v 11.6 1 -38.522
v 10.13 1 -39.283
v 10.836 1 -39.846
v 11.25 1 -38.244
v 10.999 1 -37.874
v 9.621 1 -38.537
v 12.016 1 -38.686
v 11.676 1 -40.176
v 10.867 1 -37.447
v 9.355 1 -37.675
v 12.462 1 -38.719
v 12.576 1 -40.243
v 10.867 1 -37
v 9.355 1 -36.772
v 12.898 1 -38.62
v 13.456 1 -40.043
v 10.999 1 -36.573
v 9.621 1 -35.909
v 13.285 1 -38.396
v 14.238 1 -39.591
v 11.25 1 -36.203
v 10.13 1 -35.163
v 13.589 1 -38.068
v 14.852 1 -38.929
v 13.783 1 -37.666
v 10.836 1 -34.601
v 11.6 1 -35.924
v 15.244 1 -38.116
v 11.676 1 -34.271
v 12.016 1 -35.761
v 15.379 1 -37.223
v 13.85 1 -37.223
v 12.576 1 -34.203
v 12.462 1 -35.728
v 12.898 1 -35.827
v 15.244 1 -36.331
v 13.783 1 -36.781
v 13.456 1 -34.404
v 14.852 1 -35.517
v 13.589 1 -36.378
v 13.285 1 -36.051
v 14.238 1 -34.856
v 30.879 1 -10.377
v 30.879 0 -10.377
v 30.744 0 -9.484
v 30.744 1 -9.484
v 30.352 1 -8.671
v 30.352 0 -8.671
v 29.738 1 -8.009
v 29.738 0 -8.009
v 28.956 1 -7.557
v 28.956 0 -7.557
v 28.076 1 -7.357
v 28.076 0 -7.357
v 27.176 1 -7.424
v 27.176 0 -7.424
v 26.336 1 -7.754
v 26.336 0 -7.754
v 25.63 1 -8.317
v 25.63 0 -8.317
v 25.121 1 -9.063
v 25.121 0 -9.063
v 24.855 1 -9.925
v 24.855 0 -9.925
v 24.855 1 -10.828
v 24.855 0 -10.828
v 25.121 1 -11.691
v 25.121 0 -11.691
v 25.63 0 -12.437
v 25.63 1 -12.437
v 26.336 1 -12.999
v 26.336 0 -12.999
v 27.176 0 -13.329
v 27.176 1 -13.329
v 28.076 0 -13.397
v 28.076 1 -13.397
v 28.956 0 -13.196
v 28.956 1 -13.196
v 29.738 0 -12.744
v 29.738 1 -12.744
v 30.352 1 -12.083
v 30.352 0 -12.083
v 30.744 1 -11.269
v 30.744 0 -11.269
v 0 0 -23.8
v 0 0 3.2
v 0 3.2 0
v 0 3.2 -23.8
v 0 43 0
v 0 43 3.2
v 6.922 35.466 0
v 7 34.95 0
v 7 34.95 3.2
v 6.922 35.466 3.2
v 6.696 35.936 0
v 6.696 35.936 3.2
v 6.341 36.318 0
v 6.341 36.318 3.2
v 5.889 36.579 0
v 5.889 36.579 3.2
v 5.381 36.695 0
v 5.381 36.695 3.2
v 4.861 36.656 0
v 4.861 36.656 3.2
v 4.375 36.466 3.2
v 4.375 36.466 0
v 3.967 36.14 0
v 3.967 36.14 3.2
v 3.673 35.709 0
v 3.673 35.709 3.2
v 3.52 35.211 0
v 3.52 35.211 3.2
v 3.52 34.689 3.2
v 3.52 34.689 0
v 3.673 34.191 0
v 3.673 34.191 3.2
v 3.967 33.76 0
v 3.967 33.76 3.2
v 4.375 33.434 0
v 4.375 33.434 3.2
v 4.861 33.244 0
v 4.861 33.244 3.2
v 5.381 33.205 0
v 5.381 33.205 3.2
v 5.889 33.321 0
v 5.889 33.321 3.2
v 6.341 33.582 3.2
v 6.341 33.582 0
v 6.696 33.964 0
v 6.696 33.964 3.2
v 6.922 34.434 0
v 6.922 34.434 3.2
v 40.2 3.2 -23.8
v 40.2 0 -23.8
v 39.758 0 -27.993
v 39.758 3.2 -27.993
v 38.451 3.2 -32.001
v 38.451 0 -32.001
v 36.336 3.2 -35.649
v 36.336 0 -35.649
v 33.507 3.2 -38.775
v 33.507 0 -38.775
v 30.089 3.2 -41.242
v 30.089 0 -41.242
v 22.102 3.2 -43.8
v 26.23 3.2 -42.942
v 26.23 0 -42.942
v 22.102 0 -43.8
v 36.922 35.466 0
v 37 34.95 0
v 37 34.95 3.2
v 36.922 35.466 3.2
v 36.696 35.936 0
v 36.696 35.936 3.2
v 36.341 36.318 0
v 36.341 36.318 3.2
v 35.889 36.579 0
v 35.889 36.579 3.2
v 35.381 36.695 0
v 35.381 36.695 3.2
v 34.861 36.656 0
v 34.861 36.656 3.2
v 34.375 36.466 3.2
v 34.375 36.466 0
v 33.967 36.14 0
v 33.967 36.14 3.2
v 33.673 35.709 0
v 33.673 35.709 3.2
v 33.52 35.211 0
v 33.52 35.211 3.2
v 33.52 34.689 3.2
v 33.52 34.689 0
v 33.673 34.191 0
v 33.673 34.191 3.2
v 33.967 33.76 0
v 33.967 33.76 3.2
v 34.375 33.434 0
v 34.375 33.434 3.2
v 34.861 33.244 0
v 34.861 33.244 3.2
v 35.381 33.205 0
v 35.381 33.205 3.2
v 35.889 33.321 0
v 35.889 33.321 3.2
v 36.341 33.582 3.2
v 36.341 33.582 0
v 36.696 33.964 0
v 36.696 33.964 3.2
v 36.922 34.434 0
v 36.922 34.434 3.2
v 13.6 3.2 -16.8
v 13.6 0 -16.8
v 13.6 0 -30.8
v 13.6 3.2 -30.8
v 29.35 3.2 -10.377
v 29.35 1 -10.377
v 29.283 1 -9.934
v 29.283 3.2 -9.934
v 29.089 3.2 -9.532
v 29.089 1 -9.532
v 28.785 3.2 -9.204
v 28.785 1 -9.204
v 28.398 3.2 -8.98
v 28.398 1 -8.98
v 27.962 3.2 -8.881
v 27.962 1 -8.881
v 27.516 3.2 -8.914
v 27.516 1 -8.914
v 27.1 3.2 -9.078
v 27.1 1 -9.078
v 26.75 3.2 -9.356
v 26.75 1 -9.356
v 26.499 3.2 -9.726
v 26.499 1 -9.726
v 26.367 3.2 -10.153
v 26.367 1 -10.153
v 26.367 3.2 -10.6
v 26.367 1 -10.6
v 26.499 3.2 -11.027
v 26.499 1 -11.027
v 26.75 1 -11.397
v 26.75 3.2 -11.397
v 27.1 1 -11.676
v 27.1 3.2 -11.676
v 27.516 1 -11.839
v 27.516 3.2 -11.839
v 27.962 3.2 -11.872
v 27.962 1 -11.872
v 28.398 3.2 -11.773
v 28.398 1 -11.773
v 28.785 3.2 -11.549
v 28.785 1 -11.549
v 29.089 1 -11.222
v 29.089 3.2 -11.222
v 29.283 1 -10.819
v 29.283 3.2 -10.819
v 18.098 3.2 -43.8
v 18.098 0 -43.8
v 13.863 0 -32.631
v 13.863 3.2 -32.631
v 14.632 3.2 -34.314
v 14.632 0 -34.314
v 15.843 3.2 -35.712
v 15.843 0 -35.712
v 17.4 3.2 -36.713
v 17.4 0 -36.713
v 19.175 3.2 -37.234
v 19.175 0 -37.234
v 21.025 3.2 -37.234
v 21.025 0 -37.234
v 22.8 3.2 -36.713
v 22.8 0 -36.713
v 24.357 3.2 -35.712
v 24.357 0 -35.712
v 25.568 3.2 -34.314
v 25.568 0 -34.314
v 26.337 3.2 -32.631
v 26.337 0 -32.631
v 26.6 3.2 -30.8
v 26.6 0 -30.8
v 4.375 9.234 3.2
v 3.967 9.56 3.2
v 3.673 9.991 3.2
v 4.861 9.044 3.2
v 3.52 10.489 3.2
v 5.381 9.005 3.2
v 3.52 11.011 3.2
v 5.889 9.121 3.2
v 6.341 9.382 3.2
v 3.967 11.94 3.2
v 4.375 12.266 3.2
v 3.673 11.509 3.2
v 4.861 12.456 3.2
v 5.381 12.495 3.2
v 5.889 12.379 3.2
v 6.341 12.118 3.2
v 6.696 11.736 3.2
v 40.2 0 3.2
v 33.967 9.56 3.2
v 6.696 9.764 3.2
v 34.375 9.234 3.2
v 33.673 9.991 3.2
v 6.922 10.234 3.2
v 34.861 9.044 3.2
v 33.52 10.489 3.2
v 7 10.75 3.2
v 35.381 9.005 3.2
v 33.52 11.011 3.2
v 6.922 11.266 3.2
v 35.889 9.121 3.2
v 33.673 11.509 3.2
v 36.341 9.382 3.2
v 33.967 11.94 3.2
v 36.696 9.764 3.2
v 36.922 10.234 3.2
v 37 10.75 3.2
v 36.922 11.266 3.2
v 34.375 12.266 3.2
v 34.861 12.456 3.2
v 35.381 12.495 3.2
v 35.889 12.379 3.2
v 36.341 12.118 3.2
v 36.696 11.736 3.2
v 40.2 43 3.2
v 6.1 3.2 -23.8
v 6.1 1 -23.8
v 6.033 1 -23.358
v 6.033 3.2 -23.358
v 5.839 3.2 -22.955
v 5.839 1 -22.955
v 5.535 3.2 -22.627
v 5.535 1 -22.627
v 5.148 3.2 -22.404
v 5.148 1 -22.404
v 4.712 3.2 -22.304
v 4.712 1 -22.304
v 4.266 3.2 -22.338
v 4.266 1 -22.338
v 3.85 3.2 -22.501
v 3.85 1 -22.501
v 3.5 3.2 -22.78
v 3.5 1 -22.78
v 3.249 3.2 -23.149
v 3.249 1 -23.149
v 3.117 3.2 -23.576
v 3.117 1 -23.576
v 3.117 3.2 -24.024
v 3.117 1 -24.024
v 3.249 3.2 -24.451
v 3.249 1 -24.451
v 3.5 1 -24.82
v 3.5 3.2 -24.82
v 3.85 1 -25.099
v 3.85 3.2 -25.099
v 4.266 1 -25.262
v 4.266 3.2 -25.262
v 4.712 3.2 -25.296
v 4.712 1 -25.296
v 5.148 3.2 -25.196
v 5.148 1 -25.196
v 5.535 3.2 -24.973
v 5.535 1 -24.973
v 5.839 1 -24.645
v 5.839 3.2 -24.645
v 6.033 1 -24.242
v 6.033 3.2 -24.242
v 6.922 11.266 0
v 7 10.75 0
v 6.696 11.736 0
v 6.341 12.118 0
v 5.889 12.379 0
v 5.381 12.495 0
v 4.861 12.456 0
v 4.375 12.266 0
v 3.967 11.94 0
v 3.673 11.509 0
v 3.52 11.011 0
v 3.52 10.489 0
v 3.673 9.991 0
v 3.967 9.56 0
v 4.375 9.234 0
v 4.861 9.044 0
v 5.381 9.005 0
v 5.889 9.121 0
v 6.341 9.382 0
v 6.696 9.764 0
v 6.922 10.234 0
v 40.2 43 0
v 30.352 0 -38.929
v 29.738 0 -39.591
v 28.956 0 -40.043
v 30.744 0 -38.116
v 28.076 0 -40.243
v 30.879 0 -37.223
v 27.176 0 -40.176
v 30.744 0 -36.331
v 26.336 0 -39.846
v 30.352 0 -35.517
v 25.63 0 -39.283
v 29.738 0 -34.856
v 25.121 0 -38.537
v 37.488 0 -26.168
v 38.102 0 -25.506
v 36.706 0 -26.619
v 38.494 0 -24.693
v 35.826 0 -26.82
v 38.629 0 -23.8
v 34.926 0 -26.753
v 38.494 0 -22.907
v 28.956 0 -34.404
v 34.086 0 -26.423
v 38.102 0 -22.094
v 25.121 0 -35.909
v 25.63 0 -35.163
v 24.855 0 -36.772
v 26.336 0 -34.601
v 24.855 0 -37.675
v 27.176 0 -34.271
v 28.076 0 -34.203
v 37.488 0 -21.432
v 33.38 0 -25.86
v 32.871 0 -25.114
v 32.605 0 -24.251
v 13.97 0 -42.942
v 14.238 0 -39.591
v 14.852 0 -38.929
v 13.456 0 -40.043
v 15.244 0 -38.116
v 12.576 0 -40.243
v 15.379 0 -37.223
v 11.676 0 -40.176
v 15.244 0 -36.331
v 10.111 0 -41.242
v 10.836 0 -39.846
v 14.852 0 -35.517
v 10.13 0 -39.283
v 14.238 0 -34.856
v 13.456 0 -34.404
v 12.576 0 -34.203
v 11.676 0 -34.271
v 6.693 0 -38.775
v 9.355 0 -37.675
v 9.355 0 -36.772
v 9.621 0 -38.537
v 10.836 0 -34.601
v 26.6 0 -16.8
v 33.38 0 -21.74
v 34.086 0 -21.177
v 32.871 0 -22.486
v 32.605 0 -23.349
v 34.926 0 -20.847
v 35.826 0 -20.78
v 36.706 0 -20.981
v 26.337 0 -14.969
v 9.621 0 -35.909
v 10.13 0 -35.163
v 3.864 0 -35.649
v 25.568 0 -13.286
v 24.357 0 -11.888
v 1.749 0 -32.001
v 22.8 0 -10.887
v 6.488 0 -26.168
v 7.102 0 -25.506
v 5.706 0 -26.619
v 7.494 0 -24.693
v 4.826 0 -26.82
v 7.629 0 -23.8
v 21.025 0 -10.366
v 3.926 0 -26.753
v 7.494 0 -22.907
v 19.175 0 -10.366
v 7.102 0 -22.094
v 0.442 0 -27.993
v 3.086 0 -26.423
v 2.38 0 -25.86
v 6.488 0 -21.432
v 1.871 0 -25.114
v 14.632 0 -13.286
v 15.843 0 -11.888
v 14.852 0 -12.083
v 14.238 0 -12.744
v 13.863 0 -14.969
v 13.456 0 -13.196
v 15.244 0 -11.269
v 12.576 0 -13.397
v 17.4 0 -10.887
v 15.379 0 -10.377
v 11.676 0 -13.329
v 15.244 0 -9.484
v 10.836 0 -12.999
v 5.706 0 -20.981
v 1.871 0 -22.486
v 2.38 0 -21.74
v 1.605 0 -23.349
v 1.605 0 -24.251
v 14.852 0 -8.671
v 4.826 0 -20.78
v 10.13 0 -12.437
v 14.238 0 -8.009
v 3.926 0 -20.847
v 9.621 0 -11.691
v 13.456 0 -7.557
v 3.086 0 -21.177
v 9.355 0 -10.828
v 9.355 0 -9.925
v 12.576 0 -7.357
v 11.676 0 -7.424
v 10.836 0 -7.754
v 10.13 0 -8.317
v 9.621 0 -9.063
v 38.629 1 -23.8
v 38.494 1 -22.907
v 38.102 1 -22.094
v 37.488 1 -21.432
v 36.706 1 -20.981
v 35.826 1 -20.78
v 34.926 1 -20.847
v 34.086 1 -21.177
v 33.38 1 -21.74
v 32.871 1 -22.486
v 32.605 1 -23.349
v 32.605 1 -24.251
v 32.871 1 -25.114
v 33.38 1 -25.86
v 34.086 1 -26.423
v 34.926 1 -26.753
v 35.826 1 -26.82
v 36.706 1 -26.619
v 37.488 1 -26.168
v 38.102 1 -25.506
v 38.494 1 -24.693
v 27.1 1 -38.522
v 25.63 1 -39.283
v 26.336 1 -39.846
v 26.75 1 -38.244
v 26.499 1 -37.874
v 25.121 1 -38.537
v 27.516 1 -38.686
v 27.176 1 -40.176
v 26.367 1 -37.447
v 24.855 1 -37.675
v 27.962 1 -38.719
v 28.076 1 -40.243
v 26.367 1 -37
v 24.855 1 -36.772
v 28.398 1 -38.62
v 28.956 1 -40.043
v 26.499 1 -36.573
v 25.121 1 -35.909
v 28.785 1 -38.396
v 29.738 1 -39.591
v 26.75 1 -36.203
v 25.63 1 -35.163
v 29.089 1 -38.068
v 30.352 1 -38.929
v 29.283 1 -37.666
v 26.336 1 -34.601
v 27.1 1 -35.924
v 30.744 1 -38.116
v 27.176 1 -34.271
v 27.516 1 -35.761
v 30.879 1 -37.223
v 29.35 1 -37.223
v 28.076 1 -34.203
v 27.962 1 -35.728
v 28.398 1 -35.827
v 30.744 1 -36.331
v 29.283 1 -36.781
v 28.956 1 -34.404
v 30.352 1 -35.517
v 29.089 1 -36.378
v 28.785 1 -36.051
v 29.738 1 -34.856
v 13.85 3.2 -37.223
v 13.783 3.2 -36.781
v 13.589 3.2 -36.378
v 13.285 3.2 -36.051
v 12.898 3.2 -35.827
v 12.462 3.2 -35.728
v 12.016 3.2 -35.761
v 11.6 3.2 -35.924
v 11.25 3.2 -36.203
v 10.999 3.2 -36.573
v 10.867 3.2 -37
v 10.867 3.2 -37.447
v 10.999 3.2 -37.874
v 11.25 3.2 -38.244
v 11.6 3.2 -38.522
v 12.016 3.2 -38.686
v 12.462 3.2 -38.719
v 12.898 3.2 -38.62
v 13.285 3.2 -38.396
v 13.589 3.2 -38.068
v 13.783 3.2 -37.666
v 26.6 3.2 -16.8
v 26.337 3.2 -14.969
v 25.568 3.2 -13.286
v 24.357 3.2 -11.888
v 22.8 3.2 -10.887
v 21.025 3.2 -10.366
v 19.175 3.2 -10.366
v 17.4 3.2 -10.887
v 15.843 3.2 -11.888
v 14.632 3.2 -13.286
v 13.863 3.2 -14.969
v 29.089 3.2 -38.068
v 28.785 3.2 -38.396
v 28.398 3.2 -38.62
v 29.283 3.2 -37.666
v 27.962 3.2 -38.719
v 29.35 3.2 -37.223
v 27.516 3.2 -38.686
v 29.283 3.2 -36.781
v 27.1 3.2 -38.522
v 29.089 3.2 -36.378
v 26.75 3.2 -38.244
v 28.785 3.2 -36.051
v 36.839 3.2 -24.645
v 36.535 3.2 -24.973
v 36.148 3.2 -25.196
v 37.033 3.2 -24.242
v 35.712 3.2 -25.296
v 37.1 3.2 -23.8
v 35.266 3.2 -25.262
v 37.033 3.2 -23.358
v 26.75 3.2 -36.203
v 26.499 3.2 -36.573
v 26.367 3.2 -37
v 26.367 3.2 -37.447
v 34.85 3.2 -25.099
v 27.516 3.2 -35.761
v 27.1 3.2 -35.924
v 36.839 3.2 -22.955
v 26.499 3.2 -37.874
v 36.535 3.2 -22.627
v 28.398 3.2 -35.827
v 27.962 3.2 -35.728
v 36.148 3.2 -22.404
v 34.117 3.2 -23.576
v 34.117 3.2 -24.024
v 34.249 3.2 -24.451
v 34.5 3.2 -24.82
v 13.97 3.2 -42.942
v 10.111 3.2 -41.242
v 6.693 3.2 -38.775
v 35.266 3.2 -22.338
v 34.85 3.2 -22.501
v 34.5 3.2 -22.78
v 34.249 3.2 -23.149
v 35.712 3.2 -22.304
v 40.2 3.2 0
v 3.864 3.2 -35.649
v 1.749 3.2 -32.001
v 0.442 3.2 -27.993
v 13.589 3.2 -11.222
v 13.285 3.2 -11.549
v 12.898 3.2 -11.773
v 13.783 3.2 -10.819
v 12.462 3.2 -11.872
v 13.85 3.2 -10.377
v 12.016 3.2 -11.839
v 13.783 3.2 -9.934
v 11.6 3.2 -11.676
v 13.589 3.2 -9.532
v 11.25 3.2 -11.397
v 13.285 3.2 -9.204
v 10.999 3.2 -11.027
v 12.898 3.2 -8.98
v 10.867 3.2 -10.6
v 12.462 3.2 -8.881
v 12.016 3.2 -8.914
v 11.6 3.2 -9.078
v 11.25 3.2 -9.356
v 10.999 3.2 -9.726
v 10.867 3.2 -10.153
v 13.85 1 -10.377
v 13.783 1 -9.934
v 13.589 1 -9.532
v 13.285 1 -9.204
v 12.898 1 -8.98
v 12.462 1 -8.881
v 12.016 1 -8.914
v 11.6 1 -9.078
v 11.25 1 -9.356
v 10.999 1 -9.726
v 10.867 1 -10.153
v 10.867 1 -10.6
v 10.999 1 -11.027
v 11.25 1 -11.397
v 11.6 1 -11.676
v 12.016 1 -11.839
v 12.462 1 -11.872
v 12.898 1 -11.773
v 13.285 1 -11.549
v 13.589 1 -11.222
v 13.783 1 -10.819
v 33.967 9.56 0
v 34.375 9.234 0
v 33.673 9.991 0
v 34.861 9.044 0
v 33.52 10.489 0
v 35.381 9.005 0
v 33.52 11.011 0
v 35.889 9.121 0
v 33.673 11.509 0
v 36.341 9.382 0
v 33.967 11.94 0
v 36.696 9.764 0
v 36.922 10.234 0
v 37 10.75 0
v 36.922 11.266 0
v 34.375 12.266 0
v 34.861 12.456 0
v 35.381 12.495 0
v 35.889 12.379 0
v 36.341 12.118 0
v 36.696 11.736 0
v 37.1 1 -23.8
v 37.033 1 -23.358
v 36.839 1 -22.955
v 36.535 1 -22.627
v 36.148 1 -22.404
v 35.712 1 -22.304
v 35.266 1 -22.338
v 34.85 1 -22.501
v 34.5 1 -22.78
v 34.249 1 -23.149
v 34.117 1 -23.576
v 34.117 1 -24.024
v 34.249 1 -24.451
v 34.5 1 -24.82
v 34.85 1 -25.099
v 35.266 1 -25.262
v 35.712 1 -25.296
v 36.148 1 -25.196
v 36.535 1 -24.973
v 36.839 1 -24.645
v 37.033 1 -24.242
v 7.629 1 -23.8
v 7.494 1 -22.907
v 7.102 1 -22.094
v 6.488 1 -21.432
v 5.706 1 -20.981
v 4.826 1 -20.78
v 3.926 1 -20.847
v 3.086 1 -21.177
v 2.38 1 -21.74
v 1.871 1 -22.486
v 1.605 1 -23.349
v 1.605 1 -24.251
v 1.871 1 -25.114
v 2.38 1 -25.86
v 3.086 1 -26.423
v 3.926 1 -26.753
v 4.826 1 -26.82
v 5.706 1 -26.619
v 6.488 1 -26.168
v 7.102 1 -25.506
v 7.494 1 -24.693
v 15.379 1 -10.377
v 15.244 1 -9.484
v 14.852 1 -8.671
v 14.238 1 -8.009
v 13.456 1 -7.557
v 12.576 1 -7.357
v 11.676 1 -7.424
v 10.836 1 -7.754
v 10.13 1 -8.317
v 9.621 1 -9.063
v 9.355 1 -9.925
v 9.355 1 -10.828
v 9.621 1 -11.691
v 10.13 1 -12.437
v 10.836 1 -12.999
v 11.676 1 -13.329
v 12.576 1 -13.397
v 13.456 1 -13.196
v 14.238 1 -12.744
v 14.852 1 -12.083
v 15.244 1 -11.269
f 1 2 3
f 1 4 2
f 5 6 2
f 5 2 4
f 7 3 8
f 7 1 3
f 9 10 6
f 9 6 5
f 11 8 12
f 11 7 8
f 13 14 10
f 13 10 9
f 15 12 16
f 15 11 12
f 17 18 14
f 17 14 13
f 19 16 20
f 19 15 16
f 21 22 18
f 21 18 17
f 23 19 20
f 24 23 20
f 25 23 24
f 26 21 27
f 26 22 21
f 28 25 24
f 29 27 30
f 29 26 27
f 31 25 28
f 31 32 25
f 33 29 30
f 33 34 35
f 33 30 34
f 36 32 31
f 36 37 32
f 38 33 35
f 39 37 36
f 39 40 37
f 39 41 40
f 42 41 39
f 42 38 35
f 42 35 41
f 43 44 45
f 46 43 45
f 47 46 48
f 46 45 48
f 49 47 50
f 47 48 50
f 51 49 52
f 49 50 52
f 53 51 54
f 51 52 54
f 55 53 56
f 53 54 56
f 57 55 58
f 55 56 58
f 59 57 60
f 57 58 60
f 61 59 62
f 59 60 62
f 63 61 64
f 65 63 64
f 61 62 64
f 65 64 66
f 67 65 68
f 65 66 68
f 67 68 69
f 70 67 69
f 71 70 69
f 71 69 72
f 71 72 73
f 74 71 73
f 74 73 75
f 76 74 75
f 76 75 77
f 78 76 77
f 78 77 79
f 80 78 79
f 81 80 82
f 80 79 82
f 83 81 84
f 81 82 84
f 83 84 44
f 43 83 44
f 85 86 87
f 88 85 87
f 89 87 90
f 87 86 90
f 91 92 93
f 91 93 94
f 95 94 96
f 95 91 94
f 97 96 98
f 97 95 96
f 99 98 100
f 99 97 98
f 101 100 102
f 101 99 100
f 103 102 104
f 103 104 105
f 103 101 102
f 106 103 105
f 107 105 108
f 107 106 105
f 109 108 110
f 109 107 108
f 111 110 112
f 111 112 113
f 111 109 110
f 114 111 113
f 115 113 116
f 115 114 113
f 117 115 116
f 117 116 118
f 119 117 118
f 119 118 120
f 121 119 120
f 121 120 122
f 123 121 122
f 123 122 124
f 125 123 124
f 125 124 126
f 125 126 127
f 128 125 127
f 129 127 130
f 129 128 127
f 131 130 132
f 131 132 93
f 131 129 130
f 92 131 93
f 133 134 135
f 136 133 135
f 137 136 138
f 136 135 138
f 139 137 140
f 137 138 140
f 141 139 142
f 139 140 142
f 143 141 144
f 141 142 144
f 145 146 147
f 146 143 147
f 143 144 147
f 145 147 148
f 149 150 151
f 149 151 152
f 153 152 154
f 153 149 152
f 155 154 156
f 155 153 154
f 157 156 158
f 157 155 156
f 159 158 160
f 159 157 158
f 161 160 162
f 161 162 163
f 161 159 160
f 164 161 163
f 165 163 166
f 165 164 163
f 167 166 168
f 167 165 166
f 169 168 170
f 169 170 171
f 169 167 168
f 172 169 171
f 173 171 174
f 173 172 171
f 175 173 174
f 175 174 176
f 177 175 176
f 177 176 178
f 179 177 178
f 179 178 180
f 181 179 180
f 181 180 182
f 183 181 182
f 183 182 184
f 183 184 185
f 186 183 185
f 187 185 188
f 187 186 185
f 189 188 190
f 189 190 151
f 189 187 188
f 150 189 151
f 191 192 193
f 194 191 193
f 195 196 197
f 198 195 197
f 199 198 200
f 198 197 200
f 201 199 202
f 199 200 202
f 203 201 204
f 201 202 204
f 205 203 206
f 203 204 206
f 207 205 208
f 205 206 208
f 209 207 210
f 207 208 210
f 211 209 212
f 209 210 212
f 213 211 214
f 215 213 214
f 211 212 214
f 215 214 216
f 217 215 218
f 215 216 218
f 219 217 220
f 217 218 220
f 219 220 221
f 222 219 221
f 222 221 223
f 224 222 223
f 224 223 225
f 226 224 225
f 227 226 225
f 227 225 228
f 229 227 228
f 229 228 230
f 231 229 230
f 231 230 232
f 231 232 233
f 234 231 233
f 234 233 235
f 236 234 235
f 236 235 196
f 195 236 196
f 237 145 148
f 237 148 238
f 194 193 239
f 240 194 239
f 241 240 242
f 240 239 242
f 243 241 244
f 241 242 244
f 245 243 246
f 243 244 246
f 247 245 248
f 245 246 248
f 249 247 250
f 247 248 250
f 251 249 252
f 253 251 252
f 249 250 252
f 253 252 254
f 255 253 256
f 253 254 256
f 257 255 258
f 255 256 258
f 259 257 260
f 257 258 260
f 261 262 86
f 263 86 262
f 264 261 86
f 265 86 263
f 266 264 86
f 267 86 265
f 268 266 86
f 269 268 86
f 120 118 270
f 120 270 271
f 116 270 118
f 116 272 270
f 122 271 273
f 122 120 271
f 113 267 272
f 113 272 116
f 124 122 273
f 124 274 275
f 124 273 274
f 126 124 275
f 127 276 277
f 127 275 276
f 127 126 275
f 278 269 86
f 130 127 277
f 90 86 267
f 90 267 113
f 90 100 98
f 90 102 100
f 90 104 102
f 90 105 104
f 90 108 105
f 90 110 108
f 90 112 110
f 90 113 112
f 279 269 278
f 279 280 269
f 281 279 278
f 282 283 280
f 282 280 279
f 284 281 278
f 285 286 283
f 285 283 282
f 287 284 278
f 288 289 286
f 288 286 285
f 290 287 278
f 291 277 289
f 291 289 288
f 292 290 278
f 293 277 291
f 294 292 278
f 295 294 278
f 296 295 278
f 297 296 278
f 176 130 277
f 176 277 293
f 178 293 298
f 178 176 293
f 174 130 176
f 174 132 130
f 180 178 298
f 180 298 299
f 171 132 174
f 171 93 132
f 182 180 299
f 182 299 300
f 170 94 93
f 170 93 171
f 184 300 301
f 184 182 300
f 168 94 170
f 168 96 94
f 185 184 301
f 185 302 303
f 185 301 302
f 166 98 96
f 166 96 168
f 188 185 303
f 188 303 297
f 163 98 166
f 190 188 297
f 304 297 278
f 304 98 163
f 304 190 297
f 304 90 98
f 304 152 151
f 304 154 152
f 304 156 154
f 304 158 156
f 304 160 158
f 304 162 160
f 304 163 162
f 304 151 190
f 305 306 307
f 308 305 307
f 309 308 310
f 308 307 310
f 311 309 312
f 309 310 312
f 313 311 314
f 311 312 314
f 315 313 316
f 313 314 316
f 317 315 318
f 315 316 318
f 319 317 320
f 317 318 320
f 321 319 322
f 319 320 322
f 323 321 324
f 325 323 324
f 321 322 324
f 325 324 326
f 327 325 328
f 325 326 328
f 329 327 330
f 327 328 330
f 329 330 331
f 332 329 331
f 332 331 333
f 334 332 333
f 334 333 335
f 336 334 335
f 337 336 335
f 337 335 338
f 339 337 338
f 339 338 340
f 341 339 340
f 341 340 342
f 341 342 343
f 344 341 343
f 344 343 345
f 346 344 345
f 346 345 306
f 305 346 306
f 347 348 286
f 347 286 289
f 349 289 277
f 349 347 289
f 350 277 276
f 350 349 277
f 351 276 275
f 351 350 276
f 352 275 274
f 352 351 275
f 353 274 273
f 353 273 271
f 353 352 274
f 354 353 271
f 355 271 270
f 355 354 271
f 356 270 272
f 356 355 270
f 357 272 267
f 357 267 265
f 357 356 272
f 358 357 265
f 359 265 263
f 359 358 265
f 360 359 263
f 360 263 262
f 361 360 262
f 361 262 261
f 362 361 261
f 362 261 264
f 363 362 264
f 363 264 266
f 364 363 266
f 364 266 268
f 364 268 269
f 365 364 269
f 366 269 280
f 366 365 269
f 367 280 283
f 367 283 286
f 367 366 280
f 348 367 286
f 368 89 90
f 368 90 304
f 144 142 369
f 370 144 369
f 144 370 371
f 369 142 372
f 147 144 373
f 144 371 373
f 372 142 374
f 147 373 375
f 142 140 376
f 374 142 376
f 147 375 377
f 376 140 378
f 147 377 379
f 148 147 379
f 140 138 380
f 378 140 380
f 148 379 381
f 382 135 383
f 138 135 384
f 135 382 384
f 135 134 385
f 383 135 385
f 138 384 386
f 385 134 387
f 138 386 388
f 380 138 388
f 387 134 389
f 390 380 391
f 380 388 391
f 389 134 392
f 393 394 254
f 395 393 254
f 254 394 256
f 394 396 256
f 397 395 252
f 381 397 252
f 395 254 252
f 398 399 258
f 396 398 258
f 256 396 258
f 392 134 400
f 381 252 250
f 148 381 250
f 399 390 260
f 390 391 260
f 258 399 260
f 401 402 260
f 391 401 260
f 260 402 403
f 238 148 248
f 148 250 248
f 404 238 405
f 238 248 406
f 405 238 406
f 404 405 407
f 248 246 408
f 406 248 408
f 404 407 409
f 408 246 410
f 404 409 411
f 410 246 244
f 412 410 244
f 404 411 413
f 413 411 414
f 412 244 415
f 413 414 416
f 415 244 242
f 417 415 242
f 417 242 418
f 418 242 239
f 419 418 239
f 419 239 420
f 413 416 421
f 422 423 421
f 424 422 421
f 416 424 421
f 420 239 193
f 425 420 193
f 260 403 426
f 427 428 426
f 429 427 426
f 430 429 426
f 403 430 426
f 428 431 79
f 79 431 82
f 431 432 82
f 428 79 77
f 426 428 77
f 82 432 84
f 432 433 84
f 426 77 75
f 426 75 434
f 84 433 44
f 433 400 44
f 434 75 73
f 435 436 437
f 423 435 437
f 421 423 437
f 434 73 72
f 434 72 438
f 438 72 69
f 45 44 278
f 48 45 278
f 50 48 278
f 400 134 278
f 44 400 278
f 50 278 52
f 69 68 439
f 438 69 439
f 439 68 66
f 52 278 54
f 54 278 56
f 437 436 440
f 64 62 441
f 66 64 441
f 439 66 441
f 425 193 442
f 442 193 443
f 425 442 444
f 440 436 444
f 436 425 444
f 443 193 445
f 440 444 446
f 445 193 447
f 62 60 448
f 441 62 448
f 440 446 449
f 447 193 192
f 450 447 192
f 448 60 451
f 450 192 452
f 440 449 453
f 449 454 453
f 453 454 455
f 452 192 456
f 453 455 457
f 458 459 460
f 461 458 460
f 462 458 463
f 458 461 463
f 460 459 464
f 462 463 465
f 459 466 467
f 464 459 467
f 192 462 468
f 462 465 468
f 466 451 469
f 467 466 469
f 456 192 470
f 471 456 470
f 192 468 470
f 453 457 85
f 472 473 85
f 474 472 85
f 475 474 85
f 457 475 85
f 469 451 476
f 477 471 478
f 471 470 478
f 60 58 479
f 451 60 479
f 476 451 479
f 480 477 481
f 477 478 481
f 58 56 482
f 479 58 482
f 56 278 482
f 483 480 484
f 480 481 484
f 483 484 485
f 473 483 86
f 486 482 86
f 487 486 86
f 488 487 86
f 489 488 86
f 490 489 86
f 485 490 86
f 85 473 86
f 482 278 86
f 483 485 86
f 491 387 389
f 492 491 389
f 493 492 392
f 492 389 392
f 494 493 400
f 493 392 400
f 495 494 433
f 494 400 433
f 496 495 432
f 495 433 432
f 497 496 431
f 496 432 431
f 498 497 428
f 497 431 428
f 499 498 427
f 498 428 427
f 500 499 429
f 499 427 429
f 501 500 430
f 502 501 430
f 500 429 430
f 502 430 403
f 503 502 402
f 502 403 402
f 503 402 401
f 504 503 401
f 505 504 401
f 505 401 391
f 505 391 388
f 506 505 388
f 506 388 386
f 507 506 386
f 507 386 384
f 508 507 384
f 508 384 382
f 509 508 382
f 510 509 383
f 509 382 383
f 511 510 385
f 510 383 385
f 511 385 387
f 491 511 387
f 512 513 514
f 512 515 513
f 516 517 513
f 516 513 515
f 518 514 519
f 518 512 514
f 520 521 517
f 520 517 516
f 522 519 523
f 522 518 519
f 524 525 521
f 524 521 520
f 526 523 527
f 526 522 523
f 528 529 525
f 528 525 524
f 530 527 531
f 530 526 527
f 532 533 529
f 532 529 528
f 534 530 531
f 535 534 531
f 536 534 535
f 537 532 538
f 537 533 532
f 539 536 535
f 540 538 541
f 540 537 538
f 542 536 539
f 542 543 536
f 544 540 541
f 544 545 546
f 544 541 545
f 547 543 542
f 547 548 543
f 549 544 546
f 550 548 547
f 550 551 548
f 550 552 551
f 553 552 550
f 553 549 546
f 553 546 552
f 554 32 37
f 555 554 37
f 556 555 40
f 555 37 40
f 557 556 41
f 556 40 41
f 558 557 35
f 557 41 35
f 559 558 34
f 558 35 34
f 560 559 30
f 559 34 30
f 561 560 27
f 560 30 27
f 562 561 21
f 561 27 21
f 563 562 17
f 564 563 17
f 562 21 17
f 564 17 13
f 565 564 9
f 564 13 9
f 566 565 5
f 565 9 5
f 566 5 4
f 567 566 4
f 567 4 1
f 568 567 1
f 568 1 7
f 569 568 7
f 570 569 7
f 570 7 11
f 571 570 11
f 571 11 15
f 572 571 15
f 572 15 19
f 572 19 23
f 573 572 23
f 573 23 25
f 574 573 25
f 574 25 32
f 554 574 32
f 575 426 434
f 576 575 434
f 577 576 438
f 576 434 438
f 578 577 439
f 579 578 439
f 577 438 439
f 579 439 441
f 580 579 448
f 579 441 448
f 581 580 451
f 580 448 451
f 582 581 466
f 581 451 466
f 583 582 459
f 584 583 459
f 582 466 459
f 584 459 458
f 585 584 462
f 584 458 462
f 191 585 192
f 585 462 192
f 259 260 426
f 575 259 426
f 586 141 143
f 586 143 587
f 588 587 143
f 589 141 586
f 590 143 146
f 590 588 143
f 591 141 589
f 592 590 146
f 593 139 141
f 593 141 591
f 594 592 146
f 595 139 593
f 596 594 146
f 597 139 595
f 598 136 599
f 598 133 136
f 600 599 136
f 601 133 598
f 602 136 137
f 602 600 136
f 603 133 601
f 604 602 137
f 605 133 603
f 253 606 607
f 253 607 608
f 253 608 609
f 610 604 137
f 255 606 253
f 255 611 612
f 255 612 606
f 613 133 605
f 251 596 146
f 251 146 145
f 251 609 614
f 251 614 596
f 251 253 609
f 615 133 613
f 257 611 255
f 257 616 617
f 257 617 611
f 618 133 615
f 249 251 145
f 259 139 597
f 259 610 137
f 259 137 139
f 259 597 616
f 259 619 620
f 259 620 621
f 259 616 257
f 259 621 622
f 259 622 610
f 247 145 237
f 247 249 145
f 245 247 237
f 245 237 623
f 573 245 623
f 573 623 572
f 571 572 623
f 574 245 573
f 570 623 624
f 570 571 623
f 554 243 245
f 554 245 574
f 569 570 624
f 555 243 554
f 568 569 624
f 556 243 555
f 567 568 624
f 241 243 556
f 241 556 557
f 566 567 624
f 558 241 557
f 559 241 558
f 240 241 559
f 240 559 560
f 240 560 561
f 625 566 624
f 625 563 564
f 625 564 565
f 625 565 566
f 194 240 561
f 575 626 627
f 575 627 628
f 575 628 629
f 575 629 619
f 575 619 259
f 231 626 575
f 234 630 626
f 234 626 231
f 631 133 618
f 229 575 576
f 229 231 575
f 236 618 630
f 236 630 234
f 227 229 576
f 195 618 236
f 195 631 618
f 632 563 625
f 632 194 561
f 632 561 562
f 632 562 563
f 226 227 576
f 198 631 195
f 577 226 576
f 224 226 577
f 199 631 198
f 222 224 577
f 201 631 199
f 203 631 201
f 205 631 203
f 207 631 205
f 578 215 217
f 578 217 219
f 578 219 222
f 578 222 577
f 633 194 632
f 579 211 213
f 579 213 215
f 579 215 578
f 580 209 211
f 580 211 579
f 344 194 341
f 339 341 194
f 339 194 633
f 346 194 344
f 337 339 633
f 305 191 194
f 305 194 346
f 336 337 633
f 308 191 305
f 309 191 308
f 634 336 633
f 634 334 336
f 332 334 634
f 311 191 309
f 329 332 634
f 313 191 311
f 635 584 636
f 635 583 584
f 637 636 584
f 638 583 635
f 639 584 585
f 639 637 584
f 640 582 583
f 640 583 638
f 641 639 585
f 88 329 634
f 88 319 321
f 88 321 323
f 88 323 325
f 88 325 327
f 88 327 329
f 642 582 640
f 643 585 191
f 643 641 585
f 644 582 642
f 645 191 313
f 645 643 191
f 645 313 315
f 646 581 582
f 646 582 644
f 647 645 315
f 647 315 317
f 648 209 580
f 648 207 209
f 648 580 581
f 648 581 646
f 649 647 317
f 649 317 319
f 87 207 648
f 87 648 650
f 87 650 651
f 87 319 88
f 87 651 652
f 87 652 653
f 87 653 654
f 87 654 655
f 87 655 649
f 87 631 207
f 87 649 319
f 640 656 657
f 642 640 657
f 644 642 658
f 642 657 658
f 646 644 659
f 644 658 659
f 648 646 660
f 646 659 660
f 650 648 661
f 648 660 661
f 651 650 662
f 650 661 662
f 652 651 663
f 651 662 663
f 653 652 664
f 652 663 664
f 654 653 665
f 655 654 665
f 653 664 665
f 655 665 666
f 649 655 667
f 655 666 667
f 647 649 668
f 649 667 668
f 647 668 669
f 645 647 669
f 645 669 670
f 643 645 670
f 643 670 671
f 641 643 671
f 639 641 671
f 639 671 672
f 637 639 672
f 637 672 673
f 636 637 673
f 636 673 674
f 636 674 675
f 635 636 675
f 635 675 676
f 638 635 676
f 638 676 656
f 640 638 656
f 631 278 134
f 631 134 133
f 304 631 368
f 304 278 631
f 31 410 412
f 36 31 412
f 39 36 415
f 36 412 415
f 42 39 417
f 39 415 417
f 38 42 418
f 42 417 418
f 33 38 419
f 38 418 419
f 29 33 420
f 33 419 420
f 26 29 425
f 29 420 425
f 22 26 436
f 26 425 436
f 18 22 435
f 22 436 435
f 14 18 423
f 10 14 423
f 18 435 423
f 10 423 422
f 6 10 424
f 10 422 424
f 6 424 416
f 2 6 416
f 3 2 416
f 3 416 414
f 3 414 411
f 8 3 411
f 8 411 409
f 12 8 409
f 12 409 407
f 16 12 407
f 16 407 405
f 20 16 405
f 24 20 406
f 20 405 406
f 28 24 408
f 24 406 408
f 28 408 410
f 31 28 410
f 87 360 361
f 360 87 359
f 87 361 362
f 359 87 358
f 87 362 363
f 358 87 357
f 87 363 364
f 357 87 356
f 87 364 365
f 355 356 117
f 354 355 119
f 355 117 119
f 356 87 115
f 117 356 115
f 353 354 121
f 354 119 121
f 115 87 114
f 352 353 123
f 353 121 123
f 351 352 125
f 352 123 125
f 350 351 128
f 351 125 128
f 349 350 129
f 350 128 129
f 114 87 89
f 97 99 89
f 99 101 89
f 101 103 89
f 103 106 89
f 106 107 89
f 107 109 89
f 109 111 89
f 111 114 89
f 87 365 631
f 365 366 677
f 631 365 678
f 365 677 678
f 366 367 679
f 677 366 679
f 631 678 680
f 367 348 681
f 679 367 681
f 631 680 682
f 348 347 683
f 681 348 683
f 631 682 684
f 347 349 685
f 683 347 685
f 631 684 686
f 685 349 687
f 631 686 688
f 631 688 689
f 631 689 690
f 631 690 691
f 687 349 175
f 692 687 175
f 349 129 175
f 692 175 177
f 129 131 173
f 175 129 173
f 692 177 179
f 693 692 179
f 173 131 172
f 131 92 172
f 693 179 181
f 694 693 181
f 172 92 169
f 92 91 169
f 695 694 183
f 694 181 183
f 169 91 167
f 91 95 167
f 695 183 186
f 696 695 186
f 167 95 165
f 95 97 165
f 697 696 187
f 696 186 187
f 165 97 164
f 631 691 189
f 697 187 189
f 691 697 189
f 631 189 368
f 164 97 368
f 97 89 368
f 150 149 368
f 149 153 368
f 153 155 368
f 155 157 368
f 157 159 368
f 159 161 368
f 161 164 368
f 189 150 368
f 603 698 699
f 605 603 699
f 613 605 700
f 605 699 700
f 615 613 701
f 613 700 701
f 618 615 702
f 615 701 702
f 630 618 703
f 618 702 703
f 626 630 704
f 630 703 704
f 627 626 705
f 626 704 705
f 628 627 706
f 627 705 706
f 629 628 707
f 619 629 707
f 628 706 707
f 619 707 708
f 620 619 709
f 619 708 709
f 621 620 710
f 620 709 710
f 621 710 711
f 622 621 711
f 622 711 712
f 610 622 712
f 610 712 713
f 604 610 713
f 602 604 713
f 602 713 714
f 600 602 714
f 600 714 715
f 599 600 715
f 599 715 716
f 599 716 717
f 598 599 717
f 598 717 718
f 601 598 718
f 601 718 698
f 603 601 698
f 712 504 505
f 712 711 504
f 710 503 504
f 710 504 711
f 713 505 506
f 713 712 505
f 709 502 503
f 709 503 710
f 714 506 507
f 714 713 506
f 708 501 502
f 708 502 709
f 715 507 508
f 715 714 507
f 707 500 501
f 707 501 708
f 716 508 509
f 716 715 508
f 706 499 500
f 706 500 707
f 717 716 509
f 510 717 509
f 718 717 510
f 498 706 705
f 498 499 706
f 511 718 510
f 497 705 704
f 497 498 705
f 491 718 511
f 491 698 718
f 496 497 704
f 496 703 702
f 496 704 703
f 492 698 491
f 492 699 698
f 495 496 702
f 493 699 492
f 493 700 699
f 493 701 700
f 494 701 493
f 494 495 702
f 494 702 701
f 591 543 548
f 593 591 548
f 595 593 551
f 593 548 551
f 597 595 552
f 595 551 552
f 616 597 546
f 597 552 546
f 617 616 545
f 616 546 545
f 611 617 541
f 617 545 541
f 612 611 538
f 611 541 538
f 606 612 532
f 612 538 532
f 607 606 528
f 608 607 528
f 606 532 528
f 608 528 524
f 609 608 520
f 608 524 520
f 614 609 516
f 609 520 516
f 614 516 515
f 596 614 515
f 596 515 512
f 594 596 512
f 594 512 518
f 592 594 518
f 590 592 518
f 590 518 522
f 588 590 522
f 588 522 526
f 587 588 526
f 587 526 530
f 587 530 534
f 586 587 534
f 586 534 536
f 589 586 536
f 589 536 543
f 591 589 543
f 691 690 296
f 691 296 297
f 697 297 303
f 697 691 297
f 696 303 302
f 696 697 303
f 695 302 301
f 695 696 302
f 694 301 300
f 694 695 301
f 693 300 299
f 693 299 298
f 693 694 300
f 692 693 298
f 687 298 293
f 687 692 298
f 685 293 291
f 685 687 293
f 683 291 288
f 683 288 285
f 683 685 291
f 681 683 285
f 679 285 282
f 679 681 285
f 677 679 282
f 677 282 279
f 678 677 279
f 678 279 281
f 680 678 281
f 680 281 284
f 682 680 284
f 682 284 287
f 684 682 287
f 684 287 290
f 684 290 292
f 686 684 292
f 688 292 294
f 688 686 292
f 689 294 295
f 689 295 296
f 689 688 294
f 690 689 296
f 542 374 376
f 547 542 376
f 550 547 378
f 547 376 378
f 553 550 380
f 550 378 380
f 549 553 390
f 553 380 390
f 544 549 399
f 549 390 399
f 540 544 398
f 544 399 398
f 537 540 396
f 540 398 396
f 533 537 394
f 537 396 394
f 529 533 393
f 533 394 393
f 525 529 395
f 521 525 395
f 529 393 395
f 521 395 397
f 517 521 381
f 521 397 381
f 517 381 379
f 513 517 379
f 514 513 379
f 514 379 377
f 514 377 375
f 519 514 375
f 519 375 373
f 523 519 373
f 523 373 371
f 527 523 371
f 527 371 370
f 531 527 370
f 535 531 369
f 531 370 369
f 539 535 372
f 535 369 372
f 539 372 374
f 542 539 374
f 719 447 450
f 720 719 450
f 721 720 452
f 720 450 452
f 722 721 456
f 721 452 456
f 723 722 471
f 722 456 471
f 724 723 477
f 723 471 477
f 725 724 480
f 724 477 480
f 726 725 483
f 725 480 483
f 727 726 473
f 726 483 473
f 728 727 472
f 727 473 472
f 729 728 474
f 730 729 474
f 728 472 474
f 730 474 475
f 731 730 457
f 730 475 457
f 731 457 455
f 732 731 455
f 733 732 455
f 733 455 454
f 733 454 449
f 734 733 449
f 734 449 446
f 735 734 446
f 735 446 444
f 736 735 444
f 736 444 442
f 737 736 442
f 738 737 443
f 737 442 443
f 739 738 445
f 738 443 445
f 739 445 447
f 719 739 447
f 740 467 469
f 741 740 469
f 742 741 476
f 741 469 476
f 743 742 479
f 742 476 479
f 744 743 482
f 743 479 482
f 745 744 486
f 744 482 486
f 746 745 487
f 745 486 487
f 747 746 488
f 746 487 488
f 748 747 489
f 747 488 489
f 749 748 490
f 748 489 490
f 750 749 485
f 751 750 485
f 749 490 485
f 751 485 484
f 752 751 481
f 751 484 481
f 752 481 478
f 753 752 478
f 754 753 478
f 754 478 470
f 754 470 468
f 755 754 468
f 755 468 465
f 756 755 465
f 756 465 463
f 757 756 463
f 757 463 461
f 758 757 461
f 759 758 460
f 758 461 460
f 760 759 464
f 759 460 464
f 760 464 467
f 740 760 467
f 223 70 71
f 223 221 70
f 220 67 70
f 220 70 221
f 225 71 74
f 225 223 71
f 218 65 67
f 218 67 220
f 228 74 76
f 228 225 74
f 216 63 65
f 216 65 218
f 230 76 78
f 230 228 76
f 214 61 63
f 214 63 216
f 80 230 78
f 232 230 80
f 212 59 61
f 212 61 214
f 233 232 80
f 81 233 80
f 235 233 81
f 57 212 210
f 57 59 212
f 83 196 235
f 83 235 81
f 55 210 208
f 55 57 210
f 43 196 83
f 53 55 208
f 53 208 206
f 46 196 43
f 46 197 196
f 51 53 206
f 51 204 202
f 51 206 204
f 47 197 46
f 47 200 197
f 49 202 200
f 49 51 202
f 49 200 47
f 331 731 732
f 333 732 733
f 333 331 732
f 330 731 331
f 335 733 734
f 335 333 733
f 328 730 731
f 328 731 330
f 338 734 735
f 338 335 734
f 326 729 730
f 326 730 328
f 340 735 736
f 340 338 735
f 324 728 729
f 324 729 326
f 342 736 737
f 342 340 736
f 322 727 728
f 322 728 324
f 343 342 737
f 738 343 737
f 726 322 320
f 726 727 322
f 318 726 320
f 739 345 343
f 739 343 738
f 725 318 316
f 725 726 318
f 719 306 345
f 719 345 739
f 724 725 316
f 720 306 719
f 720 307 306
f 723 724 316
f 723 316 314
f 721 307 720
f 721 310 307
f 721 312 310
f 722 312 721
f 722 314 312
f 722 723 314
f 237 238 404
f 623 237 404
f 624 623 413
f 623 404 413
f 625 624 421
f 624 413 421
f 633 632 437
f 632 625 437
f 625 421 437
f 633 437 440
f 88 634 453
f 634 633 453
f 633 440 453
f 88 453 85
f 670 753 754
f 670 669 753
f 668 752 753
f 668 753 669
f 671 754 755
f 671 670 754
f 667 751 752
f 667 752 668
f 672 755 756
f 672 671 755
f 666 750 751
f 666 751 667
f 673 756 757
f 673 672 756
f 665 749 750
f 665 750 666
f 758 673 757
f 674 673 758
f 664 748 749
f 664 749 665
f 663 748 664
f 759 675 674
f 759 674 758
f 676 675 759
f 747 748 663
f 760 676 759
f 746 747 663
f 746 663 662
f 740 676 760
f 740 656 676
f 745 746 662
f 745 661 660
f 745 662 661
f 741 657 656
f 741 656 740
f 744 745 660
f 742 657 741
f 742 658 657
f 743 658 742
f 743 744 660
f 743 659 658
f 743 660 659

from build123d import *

# Parameters (mm, degrees)
SKETCH_1_W          = 40.2
SKETCH_1_H          = 39.8
SKETCH_1_R          = 1.75
SKETCH_1_H_2        = 3.2
EXTRUDE_1_DEPTH     = 3.2
SKETCH_2_W          = 40.2
SKETCH_2_H          = 3.2
EXTRUDE_2_DEPTH     = 43.8
SKETCH_3_R          = 1.5
CUT_EXTRUDE_1_DEPTH = 44
SKETCH_4_R          = 3.028542632
SKETCH_4_R_2        = 1.5
CUT_EXTRUDE_2_DEPTH = 1
CUT_EXTRUDE_3_DEPTH = 44


with BuildPart() as part:
    # 草图1 → 凸台-拉伸1 (new body)
    with BuildSketch(Plane.XY):
        with Locations((20.1, 23.1)):
            Rectangle(SKETCH_1_W, SKETCH_1_H)
        with Locations((5.25, 10.75)):
            Circle(SKETCH_1_R, mode=Mode.SUBTRACT)
        with Locations((35.25, 10.75)):
            Circle(SKETCH_1_R, mode=Mode.SUBTRACT)
        with Locations((5.25, 34.95)):
            Circle(SKETCH_1_R, mode=Mode.SUBTRACT)
        with Locations((35.25, 34.95)):
            Circle(SKETCH_1_R, mode=Mode.SUBTRACT)
        with Locations((20.1, 1.6)):
            Rectangle(SKETCH_1_W, SKETCH_1_H_2)
    extrude(amount=EXTRUDE_1_DEPTH)

    # 草图2 → 凸台-拉伸2 (add)
    with BuildSketch(Plane(origin=(0, 0, 0), x_dir=(-1, 0, 0), z_dir=(0, 0, -1))):
        with Locations((-20.1, 1.6)):
            Rectangle(SKETCH_2_W, SKETCH_2_H)
    extrude(amount=EXTRUDE_2_DEPTH)

    # 草图3 → 切除-拉伸1 (cut, through all)
    with BuildSketch(Plane.XZ):
        with BuildLine():
            Line((13.6, -23.8), (13.6, -30.8))
            ThreePointArc((13.6, -30.8), (20.1, -37.3), (26.6, -30.8))
            Line((26.6, -30.8), (26.6, -16.8))
            ThreePointArc((26.6, -16.8), (20.1, -10.3), (13.6, -16.8))
            Line((13.6, -16.8), (13.6, -23.8))
        make_face()
        with Locations((4.6, -23.8)):
            Circle(SKETCH_3_R)
        with Locations((12.35, -10.376606241)):
            Circle(SKETCH_3_R)
        with Locations((27.85, -10.376606241)):
            Circle(SKETCH_3_R)
        with Locations((35.6, -23.8)):
            Circle(SKETCH_3_R)
        with Locations((27.85, -37.223393759)):
            Circle(SKETCH_3_R)
        with Locations((12.35, -37.223393759)):
            Circle(SKETCH_3_R)
    extrude(amount=-CUT_EXTRUDE_1_DEPTH, mode=Mode.SUBTRACT)

    # 草图4 → 切除-拉伸2 (cut)
    with BuildSketch(Plane.XZ):
        with Locations((27.85, -37.223393759)):
            Circle(SKETCH_4_R)
        with Locations((27.85, -37.223393759)):
            Circle(SKETCH_4_R_2, mode=Mode.SUBTRACT)
        with Locations((12.35, -37.223393759)):
            Circle(SKETCH_4_R)
        with Locations((12.35, -37.223393759)):
            Circle(SKETCH_4_R_2, mode=Mode.SUBTRACT)
        with Locations((35.6, -23.8)):
            Circle(SKETCH_4_R)
        with Locations((35.6, -23.8)):
            Circle(SKETCH_4_R_2, mode=Mode.SUBTRACT)
        with Locations((27.85, -10.376606241)):
            Circle(SKETCH_4_R)
        with Locations((27.85, -10.376606241)):
            Circle(SKETCH_4_R_2, mode=Mode.SUBTRACT)
        with Locations((4.6, -23.8)):
            Circle(SKETCH_4_R)
        with Locations((12.35, -10.376606241)):
            Circle(SKETCH_4_R)
    extrude(amount=-CUT_EXTRUDE_2_DEPTH, mode=Mode.SUBTRACT)

    # 草图5 → 切除-拉伸3 (cut, through all)
    with BuildSketch(Plane.XZ):
        with BuildLine():
            ThreePointArc((18.097501561, -43.8), (5.195970031, -37.286285281), (0, -23.8))
            Line((0, -23.8), (0, -43.8))
            Line((0, -43.8), (18.097501561, -43.8))
        make_face()
        with BuildLine():
            Line((40.2, -43.8), (40.2, -23.8))
            ThreePointArc((40.2, -23.8), (35.004029969, -37.286285281), (22.102498439, -43.8))
            Line((22.102498439, -43.8), (40.2, -43.8))
        make_face()
    extrude(amount=-CUT_EXTRUDE_3_DEPTH, mode=Mode.SUBTRACT)


solid = part.part
